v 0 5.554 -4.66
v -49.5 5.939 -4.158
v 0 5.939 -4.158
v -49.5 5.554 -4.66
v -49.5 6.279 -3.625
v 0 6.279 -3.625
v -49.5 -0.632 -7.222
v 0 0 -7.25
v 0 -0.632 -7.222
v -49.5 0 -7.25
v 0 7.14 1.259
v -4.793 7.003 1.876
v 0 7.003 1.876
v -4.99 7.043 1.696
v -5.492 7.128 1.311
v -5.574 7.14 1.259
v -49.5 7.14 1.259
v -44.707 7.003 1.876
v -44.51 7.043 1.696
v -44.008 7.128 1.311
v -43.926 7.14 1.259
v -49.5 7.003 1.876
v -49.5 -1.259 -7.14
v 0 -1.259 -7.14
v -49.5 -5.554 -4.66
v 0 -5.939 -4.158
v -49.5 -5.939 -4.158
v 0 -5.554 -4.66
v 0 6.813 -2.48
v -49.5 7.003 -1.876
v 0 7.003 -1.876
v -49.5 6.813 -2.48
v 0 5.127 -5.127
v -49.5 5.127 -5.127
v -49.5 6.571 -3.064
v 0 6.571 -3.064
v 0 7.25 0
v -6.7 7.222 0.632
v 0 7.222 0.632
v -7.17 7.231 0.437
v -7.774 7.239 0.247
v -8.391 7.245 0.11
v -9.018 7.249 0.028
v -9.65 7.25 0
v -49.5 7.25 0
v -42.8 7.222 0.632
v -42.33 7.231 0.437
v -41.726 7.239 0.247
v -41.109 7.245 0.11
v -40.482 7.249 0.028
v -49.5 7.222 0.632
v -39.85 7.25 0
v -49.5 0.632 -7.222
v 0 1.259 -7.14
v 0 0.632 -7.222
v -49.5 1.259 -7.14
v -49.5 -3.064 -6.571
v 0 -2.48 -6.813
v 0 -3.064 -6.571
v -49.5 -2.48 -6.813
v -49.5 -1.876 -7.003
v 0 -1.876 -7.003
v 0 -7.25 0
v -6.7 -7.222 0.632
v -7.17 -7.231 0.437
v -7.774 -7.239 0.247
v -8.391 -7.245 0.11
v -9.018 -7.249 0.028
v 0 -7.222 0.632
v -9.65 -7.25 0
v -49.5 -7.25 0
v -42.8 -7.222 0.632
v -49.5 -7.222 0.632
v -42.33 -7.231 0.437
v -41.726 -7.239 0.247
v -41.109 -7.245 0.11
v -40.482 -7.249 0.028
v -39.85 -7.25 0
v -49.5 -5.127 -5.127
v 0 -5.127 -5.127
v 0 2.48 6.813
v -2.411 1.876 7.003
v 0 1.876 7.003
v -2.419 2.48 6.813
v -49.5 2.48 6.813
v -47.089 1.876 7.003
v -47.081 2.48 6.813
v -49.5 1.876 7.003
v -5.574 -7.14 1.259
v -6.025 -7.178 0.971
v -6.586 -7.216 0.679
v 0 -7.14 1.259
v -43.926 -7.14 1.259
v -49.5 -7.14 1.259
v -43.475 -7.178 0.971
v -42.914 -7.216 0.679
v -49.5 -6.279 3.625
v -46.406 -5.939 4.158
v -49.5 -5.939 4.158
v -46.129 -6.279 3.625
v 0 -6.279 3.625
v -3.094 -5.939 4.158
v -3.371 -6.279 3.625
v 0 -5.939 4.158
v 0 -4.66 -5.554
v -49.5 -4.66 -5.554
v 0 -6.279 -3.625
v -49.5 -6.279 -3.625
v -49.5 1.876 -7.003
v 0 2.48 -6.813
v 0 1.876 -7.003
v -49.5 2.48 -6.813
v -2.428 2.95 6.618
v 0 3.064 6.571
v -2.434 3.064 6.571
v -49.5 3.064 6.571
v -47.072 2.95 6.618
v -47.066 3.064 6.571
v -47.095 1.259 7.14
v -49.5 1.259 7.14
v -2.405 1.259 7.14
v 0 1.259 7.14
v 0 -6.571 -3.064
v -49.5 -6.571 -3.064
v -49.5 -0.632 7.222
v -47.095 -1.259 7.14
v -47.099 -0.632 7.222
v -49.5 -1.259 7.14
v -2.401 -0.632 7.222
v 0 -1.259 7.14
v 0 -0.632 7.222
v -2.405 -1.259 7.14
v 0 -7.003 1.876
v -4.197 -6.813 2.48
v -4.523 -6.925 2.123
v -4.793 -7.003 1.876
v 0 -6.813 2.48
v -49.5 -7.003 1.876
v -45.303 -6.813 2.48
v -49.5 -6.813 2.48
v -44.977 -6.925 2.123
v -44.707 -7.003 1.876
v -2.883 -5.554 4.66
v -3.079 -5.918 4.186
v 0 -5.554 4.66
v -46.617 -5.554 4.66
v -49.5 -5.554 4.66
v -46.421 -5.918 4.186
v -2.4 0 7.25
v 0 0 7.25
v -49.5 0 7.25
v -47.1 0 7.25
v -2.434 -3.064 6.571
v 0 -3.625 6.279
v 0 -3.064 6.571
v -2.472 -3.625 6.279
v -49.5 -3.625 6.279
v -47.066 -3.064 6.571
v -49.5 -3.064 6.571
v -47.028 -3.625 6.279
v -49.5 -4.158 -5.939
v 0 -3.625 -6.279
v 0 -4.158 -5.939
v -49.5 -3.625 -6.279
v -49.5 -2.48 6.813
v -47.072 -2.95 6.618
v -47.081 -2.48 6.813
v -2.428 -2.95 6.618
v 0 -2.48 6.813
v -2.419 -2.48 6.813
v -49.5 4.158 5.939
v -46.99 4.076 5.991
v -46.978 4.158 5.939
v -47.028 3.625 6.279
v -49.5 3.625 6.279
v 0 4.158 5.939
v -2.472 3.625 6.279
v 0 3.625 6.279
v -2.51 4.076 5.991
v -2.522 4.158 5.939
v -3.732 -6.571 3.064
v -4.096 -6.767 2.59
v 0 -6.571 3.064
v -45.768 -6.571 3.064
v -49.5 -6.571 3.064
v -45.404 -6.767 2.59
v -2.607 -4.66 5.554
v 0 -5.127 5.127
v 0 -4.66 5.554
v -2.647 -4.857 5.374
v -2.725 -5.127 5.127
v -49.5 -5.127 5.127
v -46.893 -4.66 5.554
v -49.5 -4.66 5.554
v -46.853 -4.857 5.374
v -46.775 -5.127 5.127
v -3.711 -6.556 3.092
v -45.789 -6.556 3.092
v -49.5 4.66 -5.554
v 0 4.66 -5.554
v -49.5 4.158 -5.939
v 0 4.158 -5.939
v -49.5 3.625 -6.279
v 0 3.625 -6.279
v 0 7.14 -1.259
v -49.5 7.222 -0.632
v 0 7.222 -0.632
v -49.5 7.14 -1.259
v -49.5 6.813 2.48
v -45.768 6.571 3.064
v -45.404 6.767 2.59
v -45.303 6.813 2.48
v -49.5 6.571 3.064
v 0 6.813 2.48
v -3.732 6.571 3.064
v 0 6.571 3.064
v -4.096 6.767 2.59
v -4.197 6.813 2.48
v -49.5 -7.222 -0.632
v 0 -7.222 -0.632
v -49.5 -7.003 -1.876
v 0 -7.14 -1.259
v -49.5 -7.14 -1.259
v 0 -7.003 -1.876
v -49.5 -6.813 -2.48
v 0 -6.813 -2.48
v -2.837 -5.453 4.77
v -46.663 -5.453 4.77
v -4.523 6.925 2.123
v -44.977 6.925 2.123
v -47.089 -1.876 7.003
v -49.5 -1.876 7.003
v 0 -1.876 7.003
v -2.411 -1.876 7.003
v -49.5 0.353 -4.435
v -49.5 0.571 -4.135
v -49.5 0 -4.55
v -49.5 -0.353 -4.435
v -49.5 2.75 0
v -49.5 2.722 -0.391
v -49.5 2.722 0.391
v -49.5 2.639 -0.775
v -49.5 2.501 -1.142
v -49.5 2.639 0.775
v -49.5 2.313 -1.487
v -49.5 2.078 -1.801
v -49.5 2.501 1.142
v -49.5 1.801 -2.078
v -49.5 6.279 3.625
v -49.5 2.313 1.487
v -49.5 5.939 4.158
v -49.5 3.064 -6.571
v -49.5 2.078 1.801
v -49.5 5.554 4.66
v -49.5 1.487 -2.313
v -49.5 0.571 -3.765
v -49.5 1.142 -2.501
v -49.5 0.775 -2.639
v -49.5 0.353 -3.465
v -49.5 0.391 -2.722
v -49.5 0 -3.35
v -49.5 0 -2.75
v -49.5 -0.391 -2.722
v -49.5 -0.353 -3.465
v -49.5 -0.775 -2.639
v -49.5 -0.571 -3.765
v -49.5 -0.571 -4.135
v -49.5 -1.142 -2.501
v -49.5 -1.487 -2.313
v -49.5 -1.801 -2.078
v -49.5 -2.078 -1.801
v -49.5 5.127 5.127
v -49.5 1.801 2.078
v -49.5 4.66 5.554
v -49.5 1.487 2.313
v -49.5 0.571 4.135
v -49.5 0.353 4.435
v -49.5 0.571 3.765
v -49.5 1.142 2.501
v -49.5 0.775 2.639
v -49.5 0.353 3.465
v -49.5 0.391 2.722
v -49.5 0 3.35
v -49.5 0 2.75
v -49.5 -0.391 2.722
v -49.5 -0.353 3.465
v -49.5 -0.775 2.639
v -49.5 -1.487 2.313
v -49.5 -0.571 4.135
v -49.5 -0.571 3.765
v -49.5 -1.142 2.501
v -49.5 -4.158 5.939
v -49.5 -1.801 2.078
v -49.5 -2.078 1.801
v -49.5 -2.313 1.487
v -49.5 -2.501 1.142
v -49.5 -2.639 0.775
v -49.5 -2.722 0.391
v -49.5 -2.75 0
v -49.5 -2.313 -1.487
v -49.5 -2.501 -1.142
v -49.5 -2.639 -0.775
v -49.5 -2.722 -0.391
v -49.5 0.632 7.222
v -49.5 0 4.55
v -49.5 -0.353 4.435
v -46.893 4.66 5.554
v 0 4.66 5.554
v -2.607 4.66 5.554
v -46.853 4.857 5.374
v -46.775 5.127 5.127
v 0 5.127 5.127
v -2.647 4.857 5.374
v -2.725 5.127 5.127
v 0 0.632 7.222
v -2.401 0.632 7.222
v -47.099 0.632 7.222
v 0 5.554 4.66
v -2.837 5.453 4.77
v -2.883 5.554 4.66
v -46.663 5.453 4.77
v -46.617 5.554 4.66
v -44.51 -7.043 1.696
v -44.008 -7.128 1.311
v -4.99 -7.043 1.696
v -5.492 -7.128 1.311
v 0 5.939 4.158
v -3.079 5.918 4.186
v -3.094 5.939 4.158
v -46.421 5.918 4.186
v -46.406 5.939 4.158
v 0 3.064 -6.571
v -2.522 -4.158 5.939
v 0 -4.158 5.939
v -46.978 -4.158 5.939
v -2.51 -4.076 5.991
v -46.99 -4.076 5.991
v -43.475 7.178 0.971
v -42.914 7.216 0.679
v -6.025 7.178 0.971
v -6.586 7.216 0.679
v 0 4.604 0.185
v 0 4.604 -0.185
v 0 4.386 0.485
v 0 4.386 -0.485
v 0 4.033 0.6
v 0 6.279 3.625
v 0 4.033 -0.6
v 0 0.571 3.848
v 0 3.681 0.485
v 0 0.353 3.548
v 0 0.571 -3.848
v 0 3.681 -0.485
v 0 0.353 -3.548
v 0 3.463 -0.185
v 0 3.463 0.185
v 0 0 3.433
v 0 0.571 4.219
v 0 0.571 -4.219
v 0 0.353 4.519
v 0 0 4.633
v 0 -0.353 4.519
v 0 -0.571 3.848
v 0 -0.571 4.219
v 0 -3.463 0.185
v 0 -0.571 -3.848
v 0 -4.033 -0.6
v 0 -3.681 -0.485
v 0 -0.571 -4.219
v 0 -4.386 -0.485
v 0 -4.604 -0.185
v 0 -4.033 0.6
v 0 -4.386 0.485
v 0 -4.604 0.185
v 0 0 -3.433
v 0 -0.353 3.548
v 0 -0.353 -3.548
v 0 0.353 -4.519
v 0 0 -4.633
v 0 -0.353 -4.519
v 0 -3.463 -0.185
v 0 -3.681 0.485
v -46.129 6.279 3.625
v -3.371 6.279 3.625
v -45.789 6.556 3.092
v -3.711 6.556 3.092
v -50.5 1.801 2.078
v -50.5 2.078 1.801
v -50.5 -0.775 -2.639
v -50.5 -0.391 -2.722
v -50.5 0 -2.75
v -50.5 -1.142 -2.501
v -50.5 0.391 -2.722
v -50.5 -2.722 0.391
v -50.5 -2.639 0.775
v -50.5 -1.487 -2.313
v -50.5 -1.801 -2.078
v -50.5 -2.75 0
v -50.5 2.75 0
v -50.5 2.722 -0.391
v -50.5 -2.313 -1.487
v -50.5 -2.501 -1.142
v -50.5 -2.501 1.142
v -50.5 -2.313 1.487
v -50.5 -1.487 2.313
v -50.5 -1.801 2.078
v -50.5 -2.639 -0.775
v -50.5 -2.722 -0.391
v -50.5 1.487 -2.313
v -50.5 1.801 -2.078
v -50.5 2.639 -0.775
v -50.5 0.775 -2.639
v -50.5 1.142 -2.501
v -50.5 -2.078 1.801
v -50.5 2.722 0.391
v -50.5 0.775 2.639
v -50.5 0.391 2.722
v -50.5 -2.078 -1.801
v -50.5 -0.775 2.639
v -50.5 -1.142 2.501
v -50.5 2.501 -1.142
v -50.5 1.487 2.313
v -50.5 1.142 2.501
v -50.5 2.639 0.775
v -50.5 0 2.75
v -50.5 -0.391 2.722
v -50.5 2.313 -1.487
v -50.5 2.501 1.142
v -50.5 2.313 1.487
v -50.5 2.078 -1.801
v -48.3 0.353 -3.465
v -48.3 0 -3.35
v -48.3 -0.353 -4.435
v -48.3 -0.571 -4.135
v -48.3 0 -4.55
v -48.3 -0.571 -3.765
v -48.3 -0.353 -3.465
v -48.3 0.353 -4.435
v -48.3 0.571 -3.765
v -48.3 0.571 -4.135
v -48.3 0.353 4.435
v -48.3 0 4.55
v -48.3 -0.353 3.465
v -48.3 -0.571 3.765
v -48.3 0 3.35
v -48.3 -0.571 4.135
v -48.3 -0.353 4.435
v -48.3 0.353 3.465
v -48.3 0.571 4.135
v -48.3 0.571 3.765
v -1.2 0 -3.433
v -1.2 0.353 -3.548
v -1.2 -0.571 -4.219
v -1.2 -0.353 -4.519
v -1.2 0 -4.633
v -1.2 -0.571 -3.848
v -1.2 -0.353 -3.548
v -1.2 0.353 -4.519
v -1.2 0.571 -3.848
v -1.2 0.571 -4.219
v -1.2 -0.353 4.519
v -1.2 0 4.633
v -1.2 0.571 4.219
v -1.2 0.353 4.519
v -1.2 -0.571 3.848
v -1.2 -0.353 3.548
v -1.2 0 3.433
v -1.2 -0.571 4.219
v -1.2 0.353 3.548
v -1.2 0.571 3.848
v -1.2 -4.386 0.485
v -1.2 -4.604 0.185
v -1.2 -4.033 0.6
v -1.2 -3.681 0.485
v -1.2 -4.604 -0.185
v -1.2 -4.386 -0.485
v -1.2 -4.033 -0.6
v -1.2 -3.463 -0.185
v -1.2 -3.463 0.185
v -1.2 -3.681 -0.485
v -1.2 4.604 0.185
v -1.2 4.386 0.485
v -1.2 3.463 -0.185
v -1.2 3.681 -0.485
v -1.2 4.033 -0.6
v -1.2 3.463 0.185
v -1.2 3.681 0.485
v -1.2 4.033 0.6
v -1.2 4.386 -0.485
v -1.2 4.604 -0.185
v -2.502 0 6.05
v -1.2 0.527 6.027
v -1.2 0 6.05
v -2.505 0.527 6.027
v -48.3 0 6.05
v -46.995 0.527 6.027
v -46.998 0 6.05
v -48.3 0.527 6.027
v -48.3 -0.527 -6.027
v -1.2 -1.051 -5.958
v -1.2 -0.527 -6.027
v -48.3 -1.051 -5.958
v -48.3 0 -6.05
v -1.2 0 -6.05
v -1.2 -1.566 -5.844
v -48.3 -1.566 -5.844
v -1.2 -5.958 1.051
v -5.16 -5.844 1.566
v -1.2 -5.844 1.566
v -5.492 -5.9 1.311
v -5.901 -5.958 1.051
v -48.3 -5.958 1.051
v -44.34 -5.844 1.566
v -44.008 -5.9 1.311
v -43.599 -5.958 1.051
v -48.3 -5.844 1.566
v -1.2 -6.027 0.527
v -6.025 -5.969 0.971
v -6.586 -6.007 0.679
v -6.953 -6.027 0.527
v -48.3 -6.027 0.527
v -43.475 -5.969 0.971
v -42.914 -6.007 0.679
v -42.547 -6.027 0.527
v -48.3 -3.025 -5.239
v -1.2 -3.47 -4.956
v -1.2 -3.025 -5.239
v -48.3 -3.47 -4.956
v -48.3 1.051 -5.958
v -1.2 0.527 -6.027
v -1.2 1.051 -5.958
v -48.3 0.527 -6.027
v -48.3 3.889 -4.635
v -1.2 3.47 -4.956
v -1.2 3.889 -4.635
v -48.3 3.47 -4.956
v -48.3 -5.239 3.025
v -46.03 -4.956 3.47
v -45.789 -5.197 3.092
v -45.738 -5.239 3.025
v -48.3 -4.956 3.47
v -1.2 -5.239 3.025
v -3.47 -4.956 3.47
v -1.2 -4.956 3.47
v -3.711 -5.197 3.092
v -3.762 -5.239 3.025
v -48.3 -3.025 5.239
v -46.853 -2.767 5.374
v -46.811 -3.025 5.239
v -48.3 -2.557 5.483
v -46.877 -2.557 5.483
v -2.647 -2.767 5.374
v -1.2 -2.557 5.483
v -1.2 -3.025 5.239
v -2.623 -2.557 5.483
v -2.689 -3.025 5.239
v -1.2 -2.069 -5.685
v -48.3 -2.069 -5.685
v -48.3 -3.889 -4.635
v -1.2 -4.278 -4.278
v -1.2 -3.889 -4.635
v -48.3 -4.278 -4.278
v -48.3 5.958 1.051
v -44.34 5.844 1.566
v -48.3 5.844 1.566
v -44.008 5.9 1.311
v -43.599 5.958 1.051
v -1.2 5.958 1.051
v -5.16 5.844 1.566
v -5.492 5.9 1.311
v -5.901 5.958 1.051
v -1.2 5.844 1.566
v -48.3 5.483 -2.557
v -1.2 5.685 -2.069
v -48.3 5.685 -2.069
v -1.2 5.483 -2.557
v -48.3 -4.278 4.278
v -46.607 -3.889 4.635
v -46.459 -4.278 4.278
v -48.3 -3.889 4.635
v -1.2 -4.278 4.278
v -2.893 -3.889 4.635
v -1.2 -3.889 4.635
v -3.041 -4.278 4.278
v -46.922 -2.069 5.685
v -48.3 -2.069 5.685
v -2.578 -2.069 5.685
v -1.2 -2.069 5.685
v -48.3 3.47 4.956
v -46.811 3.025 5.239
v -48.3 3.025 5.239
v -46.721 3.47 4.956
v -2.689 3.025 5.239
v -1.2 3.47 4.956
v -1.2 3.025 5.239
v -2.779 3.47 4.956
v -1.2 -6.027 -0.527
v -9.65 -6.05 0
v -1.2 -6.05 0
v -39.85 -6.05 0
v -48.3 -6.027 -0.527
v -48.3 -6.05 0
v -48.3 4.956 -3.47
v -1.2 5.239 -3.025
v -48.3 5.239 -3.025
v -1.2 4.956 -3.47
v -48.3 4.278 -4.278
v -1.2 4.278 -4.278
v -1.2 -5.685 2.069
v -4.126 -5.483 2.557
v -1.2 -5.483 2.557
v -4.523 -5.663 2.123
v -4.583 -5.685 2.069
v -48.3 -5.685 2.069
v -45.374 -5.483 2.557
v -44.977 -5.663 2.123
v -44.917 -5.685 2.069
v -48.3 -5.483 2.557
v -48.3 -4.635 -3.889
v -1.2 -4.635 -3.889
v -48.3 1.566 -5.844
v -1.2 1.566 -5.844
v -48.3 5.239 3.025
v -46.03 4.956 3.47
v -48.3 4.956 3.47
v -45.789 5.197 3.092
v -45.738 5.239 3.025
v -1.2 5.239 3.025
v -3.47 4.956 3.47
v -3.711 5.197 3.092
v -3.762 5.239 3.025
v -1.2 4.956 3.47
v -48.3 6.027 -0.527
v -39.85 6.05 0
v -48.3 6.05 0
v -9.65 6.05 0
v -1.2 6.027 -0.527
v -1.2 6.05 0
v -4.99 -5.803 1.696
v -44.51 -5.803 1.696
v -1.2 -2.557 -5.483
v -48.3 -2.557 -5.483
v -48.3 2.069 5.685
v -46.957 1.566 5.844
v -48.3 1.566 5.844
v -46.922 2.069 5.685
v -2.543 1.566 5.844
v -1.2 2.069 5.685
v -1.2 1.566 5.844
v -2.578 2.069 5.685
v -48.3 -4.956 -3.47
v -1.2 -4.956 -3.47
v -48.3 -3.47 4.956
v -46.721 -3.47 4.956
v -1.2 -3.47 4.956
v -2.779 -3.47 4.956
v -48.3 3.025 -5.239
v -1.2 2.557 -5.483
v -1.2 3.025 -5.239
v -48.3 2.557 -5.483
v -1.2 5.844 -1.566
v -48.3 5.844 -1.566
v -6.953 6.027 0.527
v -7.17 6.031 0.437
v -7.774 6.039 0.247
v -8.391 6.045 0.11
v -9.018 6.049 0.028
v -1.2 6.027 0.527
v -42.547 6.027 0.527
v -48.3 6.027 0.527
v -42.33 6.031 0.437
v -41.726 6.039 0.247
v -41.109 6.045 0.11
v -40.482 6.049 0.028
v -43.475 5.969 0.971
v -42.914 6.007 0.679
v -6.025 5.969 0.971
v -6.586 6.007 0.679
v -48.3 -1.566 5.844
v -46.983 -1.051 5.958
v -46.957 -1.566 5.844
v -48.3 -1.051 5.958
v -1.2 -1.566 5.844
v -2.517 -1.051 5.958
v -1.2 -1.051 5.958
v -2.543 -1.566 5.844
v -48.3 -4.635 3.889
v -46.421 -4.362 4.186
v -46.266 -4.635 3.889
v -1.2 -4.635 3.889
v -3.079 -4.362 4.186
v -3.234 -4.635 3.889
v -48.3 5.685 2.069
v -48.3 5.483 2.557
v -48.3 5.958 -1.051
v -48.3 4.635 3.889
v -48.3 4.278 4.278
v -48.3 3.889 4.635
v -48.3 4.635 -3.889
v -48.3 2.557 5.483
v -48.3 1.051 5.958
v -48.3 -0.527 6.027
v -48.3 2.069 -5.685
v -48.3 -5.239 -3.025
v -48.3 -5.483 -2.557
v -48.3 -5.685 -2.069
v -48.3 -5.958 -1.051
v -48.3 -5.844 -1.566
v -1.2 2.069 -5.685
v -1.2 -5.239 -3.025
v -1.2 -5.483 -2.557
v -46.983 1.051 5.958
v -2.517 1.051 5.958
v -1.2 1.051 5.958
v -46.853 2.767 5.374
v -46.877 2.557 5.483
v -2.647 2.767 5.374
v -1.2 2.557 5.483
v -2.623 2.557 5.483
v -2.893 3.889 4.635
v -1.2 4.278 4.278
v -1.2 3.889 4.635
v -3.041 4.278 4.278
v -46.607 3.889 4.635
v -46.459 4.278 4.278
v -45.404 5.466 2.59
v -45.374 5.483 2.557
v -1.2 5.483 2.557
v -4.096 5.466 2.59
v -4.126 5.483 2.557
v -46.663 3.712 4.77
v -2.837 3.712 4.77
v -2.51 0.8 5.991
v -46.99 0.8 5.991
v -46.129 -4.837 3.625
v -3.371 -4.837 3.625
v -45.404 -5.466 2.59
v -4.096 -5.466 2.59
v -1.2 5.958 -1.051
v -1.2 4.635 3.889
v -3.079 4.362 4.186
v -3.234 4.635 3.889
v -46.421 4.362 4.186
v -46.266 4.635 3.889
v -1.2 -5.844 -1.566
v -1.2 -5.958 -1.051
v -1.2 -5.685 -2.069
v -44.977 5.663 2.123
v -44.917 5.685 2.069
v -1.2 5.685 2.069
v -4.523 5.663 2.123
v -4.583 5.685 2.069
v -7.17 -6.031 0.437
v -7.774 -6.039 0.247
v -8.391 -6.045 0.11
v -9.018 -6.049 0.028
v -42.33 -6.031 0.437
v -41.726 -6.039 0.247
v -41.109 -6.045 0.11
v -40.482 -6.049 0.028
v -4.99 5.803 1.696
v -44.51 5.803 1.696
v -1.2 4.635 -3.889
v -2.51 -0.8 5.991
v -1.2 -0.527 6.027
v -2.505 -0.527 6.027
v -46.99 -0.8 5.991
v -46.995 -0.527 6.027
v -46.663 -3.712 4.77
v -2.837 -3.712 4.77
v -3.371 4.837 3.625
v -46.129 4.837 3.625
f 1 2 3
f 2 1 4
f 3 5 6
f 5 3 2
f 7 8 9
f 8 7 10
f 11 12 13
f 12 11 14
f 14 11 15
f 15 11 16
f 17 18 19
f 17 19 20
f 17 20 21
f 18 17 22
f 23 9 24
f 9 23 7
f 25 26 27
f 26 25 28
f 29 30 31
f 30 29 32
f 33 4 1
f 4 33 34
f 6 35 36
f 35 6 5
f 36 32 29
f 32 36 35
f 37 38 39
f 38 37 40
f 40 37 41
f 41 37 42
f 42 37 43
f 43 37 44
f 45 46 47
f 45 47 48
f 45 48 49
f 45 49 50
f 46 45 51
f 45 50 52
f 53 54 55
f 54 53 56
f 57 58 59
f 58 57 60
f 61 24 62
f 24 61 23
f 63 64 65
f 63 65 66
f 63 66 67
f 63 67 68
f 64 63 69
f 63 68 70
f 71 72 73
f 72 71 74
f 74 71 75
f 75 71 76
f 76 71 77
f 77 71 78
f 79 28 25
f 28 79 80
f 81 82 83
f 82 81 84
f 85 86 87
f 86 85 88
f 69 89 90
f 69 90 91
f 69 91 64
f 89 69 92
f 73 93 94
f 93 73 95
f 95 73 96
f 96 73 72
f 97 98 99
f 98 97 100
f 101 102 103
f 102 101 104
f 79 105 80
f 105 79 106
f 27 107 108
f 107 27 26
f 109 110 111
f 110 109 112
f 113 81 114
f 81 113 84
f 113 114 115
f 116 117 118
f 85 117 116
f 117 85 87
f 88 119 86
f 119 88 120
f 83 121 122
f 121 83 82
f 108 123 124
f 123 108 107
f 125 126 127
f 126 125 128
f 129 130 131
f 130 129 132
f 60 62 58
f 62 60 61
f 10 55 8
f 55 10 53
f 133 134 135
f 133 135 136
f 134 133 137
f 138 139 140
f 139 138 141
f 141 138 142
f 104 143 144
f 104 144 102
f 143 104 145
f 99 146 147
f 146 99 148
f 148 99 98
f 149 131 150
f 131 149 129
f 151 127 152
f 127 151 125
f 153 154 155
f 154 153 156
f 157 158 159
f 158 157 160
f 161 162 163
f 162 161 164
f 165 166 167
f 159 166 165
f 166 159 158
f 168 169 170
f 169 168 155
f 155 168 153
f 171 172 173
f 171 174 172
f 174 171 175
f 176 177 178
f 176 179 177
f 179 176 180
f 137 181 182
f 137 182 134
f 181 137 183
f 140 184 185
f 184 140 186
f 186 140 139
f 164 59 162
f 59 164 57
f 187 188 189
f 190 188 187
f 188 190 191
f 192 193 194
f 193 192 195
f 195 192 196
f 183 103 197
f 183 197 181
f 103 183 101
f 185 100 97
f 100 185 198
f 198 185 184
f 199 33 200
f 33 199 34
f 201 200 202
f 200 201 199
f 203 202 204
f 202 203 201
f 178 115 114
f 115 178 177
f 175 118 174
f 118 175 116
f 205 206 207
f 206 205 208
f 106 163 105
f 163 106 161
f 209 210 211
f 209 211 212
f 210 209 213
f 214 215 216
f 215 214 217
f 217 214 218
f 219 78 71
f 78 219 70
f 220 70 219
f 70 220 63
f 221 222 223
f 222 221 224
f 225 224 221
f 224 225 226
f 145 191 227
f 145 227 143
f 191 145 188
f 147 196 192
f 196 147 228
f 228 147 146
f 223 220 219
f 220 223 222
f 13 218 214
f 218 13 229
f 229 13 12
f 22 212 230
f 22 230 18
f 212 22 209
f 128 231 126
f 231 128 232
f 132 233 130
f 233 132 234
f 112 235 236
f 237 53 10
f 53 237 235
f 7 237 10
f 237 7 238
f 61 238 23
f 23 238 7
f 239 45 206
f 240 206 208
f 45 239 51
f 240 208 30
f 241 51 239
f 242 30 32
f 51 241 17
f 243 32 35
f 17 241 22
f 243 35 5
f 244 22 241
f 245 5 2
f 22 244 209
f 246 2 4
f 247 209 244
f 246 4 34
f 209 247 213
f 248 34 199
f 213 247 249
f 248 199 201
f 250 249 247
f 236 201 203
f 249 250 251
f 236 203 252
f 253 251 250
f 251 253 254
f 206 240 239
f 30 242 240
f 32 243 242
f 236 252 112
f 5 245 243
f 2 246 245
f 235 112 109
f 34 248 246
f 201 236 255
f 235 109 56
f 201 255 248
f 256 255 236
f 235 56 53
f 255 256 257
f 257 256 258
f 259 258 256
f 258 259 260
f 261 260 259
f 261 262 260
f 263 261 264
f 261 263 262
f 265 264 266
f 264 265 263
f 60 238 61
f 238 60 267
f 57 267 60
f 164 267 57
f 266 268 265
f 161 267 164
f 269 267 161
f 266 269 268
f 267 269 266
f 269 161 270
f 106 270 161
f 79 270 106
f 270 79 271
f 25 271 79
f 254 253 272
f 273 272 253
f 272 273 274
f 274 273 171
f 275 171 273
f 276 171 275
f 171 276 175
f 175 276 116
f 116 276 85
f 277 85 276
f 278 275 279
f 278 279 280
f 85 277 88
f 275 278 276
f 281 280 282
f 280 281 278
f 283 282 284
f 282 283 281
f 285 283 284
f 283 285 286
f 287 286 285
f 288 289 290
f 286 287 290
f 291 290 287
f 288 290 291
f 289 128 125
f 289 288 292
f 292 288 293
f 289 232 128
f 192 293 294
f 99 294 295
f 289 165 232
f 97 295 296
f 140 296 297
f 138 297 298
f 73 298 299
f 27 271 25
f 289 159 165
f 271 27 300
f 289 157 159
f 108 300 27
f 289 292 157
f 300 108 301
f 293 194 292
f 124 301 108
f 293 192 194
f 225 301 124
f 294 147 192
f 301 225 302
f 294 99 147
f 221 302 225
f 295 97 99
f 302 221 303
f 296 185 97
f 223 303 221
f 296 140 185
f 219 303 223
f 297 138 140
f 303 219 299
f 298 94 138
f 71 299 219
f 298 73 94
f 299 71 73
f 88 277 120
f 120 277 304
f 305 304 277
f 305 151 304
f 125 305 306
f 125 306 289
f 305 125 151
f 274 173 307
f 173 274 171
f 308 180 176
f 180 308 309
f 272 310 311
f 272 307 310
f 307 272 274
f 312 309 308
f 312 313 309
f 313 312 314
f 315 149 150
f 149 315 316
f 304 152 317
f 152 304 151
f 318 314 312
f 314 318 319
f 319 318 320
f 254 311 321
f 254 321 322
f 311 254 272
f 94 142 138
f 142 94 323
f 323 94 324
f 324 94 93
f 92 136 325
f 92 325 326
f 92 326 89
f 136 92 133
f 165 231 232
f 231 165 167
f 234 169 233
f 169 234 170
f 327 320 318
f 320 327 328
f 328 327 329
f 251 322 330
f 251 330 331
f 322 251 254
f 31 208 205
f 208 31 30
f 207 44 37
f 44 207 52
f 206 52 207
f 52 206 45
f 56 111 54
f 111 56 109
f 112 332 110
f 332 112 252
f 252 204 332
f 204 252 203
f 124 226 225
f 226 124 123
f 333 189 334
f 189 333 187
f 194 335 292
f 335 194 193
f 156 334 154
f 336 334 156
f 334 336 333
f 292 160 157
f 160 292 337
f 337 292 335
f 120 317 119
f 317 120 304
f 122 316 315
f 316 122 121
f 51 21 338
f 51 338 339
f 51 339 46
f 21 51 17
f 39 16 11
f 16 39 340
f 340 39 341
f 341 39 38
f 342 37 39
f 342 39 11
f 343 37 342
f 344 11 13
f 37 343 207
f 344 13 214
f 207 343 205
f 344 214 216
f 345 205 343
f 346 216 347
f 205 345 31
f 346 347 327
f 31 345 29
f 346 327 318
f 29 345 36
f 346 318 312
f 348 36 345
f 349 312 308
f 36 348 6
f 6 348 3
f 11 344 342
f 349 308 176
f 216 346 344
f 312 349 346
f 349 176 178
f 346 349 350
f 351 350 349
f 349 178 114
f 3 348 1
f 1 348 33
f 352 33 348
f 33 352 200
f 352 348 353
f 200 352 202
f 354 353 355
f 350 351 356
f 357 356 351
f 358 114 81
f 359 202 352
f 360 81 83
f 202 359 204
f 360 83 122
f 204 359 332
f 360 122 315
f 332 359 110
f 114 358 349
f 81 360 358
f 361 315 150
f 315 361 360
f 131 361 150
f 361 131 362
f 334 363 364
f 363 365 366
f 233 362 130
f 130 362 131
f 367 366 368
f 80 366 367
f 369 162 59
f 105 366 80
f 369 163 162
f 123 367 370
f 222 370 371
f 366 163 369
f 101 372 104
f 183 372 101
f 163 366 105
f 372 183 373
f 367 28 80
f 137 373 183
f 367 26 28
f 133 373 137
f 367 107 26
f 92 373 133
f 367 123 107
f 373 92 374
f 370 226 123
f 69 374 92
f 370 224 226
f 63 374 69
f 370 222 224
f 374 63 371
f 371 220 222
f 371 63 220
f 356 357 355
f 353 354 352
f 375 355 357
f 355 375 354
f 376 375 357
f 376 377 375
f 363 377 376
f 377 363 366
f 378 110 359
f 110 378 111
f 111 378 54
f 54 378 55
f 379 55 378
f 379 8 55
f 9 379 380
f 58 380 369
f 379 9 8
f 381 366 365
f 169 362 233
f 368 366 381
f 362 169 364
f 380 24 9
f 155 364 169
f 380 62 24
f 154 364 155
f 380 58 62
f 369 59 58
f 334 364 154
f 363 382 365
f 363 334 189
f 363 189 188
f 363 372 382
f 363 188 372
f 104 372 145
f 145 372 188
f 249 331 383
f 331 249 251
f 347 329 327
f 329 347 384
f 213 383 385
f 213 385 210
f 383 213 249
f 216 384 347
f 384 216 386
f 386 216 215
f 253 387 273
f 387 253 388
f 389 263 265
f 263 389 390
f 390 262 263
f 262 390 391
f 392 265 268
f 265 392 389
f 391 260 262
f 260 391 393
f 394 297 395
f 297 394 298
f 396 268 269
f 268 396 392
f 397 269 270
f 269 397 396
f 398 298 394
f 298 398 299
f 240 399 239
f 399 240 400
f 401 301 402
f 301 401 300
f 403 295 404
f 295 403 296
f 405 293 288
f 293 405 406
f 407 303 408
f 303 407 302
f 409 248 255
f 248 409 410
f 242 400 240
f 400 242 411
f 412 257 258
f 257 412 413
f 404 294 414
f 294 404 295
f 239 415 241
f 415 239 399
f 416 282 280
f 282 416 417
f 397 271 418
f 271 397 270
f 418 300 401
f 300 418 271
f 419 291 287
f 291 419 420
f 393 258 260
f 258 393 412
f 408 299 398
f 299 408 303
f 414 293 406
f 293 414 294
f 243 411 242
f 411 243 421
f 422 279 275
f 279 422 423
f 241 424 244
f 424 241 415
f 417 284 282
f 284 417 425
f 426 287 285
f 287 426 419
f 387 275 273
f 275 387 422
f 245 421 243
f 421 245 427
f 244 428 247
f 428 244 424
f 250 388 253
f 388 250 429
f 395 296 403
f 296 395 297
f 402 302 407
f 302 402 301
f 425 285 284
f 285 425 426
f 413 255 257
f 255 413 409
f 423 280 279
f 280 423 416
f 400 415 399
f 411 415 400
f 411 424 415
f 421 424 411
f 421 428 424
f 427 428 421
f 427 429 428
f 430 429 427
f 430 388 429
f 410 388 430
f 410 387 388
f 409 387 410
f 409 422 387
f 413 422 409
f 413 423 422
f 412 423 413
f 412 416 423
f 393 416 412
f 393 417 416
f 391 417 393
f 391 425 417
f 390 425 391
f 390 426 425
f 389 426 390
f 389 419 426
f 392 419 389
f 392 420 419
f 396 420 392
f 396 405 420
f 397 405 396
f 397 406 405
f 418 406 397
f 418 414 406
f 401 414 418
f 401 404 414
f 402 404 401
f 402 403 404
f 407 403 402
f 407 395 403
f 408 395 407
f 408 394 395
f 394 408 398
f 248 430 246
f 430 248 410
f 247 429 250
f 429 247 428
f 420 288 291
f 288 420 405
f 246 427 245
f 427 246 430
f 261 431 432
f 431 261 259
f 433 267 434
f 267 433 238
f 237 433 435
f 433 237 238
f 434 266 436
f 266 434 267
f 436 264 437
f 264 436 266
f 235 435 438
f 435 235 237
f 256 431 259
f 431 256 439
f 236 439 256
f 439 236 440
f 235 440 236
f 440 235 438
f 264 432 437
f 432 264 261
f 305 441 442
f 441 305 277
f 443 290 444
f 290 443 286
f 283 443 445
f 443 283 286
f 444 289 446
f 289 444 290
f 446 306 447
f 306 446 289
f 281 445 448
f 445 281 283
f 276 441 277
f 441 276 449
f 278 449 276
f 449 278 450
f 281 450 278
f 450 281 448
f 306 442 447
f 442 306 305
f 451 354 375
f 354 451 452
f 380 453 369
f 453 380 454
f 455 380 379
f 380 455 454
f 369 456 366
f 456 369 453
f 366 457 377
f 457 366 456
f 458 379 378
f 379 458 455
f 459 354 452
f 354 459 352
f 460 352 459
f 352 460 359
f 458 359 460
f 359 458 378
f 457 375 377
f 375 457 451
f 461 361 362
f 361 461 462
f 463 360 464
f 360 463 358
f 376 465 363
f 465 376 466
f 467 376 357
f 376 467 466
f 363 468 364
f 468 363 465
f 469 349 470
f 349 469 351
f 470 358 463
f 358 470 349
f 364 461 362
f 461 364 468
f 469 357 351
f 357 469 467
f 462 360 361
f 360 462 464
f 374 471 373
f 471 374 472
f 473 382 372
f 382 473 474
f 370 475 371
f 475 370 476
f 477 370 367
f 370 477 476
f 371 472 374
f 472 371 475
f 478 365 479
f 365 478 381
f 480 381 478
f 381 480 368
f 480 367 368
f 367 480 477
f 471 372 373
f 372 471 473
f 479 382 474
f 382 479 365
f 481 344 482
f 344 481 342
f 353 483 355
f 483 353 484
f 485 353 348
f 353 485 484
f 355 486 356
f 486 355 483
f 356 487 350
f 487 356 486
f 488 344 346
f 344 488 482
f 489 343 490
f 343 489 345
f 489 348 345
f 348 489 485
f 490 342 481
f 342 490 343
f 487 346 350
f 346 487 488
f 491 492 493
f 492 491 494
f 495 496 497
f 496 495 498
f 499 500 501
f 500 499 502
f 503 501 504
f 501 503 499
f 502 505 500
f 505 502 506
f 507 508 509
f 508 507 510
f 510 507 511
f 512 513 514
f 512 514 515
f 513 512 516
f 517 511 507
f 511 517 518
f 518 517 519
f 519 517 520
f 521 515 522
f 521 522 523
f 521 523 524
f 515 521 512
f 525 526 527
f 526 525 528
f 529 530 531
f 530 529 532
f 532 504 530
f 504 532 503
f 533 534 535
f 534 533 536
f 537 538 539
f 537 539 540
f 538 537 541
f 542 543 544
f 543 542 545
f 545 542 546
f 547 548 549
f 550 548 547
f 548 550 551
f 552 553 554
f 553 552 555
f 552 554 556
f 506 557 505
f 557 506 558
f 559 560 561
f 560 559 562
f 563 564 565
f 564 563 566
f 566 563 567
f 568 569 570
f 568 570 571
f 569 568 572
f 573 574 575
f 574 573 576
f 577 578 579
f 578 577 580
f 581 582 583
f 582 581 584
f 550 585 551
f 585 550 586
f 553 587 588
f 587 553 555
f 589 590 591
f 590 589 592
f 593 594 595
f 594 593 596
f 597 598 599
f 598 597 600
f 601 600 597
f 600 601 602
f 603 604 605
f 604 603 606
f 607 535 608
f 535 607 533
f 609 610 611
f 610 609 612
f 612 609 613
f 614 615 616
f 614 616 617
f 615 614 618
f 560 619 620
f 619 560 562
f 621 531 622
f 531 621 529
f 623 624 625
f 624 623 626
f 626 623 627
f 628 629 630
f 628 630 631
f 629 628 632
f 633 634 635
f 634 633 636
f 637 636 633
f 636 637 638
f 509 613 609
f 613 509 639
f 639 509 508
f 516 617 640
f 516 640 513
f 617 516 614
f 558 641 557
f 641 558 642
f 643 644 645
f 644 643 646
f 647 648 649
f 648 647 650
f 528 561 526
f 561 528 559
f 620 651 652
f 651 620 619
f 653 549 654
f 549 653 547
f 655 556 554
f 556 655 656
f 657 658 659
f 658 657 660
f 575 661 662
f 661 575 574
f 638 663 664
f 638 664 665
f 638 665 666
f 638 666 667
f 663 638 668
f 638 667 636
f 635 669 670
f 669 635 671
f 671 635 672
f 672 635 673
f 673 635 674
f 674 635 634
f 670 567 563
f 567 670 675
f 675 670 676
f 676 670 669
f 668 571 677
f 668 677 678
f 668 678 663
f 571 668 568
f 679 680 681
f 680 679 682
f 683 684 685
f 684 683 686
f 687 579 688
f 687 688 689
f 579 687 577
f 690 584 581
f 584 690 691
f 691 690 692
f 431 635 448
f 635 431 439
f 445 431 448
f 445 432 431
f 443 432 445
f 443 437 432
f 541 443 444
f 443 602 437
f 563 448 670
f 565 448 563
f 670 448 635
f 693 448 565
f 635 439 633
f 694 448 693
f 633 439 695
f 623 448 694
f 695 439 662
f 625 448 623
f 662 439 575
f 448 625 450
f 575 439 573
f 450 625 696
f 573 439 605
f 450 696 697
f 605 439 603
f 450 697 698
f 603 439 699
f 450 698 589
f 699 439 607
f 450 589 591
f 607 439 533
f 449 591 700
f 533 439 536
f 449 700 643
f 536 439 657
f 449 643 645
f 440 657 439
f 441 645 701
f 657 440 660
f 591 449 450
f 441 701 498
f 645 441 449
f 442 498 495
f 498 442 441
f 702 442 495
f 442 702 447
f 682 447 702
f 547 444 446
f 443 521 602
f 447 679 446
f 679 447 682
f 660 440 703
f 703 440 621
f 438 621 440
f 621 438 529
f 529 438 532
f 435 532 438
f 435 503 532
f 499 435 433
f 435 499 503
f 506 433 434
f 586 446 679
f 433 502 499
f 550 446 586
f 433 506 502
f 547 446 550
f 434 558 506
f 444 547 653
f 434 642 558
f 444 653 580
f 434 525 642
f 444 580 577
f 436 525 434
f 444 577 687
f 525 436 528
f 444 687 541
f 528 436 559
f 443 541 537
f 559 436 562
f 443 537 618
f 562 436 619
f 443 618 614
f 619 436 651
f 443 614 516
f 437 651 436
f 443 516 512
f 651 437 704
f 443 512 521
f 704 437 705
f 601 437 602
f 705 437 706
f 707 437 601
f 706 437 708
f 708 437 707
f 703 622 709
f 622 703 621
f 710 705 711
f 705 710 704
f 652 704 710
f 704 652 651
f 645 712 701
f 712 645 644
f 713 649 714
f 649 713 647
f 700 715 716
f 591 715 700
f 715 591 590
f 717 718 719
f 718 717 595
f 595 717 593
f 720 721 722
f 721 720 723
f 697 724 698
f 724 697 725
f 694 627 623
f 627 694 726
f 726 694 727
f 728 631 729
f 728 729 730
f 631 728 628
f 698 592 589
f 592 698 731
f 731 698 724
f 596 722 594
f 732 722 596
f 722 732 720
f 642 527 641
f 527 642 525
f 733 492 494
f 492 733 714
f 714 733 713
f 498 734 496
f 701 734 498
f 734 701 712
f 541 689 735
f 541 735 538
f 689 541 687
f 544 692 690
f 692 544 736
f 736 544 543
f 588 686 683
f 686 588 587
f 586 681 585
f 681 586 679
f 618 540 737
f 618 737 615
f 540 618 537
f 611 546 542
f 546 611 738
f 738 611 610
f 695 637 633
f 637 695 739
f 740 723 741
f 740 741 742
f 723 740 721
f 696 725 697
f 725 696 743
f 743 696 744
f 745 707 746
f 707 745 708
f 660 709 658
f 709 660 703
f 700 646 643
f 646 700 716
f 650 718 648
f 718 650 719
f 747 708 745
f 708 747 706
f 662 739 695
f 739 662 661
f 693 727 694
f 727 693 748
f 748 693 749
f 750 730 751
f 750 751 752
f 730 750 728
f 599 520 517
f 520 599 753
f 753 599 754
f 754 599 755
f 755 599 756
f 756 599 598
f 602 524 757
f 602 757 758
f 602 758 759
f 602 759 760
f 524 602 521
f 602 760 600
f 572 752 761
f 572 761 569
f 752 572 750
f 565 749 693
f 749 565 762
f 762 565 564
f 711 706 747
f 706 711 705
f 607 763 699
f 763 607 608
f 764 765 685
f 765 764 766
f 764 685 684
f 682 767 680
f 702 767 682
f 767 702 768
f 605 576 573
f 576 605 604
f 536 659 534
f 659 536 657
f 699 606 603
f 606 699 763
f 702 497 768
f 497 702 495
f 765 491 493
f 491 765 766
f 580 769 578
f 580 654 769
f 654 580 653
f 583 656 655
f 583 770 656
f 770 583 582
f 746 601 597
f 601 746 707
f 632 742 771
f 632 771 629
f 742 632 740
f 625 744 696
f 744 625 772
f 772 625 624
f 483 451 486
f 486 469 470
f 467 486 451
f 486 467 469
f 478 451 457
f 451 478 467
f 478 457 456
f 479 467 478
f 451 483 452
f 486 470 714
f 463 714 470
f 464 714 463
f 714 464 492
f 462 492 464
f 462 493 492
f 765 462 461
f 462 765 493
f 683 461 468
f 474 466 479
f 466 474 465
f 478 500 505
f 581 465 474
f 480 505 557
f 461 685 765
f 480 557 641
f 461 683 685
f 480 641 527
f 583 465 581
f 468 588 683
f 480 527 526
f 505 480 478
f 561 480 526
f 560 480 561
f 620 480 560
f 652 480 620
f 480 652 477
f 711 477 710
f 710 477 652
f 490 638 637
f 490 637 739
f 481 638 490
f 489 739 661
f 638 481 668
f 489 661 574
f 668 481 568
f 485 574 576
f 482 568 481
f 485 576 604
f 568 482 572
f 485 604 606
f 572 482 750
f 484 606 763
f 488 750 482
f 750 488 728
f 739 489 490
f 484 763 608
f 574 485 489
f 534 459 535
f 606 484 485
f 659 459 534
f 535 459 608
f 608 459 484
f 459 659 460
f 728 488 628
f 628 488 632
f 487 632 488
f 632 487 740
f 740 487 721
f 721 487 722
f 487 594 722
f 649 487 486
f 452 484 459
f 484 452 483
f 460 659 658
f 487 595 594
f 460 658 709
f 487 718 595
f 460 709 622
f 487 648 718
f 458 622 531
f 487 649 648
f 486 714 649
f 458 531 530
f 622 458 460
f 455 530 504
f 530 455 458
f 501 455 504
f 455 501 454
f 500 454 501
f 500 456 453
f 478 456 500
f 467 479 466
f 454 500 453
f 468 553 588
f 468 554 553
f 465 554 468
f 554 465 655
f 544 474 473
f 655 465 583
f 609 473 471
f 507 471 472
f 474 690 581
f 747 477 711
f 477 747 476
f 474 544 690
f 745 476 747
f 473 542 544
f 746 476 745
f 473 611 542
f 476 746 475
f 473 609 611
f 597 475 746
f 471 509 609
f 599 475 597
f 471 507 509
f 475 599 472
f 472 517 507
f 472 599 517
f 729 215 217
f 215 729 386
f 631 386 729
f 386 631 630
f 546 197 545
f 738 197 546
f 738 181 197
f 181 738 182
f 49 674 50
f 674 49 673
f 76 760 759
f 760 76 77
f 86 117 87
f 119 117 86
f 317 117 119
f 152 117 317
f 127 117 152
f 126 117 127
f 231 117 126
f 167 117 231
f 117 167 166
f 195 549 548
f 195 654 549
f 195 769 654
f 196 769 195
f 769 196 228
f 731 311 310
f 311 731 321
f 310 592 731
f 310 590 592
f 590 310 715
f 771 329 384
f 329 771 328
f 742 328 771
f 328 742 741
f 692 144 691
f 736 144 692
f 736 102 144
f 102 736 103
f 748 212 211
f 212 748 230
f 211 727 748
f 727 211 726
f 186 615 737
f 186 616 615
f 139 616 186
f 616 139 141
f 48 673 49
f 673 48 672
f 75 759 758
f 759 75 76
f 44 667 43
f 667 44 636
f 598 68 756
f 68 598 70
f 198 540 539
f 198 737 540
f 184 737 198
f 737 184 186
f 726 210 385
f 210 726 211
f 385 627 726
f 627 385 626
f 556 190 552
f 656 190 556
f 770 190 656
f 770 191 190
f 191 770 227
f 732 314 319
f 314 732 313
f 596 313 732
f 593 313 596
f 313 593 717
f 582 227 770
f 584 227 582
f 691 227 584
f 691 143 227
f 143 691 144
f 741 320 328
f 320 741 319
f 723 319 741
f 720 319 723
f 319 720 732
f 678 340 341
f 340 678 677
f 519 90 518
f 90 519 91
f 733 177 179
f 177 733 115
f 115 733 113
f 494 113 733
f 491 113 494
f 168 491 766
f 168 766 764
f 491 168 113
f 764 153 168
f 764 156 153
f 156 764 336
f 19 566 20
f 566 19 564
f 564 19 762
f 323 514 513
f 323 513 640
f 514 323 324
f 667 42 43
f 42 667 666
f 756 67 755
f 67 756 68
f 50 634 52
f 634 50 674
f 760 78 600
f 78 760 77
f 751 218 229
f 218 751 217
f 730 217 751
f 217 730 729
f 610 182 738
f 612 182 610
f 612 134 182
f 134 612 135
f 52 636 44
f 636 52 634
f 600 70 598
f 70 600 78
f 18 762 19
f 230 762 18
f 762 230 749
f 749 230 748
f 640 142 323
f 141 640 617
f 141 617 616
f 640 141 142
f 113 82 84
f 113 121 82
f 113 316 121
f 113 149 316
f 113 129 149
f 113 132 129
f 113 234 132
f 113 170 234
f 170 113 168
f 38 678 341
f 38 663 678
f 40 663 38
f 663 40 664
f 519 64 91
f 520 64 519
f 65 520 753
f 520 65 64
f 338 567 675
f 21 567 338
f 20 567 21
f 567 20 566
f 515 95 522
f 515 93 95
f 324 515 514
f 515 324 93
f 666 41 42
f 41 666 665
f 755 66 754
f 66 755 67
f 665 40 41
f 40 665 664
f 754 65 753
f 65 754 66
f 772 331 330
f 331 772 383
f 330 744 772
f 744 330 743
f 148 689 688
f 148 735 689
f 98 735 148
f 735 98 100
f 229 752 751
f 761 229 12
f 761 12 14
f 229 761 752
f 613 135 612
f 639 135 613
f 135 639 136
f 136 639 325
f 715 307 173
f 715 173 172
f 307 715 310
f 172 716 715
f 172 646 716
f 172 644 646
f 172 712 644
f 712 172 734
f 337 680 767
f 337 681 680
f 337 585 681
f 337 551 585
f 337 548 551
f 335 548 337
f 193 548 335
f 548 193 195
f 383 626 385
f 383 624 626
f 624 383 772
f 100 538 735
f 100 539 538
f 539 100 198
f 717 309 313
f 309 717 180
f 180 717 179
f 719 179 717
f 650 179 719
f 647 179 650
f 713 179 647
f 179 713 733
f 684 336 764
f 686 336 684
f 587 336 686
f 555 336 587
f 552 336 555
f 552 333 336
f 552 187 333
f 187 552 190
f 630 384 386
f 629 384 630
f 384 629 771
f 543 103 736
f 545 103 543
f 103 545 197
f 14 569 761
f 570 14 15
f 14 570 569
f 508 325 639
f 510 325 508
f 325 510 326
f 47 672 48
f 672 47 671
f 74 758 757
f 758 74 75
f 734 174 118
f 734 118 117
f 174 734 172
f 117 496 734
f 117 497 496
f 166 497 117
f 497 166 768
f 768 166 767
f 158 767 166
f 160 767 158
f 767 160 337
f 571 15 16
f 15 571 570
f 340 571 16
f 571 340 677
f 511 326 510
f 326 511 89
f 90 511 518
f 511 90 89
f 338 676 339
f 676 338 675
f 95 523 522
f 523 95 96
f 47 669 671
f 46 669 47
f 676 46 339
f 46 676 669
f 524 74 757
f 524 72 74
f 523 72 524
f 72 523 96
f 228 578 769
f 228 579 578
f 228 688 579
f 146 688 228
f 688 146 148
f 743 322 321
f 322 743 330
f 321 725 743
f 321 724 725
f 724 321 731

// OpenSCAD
////////////////////////////////////////////////////////////////////////////////
//
// Dummy Battery
//
////////////////////////////////////////////////////////////////////////////////

// battery type (for the 'Generic' type set the values in the 'Generic Battery' section below)
battery_type    = "AA" ; // [AAA,AA,C,D,Generic,Demo]

/* [Settings for Generic Battery (mm)] */
// diameter of the body
body_diameter   = 14.5 ; // [8:0.1:40]
// height of body plus pin
body_height     = 50.5 ; // [35:0.1:60]
// width of the body wall
body_wall_width =  1.2 ; // [0.7:0.1:5]
// diameter of the pin
pin_diameter    =  5.5 ; // [3:0.1:12]
// height of the pin
pin_height      =  1.0 ; // [0.7:0.1:2.5]
// diameter of the holes for the wire
wire_diameter   =  1.2 ; // [0.7:0.1:2]

////////////////////////////////////////////////////////////////////////////////

/* [Hidden] */

// column index into Batt
cName        = 0 ; // name
cDiameter    = 1 ; // body diameter
cHeight      = 2 ; // body height (incl pin height)
cWidth       = 3 ; // wall width
cPinDiameter = 4 ; // pin diameter
cPinHeight   = 5 ; // pin width
cWire        = 6 ; // wire diameter

/*
  Dimensions:
  
  D   http://data.energizer.com/pdfs/e95.pdf
      http://professional.duracell.com/downloads/datasheets/product/Industrial/Industrial%20D.pdf
  C   http://data.energizer.com/pdfs/e93.pdf
      http://professional.duracell.com/downloads/datasheets/product/Industrial/Industrial%20C.pdf  
  AA  http://data.energizer.com/pdfs/e91.pdf
      http://professional.duracell.com/downloads/datasheets/product/Industrial/Industrial%20AA.pdf
  AAA http://data.energizer.com/pdfs/l92.pdf
      http://professional.duracell.com/downloads/datasheets/product/Industrial/Industrial%20AAA.pdf
*/

// Note: Battery length is the height of the battery body and plus the pin height.
Batt =
[ // name, diam, heig, wid, pinD, pinH, wire
  [ "D"  , 34.2, 61.5, 1.5,  9.5,  1.5, 1.2 ],
  [ "C"  , 26.2, 50.0, 1.5,  7.5,  1.5, 1.2 ],
  [ "AA" , 14.5, 50.5, 1.2,  5.5,  1.0, 1.2 ],
  [ "AAA", 10.5, 44.5, 1.0,  3.8,  0.8, 1.2 ]
] ;

$fa =  5 ;
$fs =  0.4 ;

////////////////////////////////////////////////////////////////////////////////

module battery(batt)
{
  radius = batt[cDiameter] / 2 ;
  height = batt[cHeight] - batt[cPinHeight] ;

  difference()
  {
    union()
    {
      cylinder(h=height, r=radius); // outer
      translate([0,0,height-0.1])
      {
	cylinder(h=batt[cPinHeight]+0.1, d=batt[cPinDiameter]) ; // pin on top
      }
    }
    color("lightgreen")
    translate([0, 0, batt[cWidth]]) { cylinder(h=height-2*batt[cWidth], r=radius-batt[cWidth]) ; }  // inner

    // (+) wire
    color("red")
    {
      offsetTop1 = (batt[cPinDiameter] + 2*batt[cWire]) / 2 ;
      offsetTop2 = batt[cDiameter]/2 - batt[cWidth] - 0.5*batt[cWire] ;
      offsetTop = offsetTop1 < offsetTop2 ? offsetTop1 : offsetTop2 ;
      translate([ offsetTop, 0,height-1.5*batt[cWidth]]) { cylinder(h=2*batt[cWidth]+batt[cPinHeight], d=batt[cWire]) ; }
      translate([-offsetTop, 0,height-1.5*batt[cWidth]]) { cylinder(h=2*batt[cWidth]+batt[cPinHeight], d=batt[cWire]) ; }
    }

    // (-) wire
    color("black")
    {
      offsetBottom = (batt[cDiameter]/2 - batt[cWidth]) * 2 / 3 ;
      translate([ offsetBottom, 0, -batt[cWidth]/2]) { cylinder(h=2*batt[cWidth], d=batt[cWire]) ; } 
      translate([-offsetBottom, 0, -batt[cWidth]/2]) { cylinder(h=2*batt[cWidth], d=batt[cWire]) ; }
      translate([ 0, offsetBottom, -batt[cWidth]/2]) { cylinder(h=2*batt[cWidth], d=batt[cWire]) ; }
      translate([ 0,-offsetBottom, -batt[cWidth]/2]) { cylinder(h=2*batt[cWidth], d=batt[cWire]) ; }
    }

    color("orange")
    hull() // cut-out
    {
      translate([-radius, radius, radius+2*batt[cWidth]])
        rotate([90,0,0])
        cylinder(h=2*radius, r=radius) ;
      translate([-radius, radius, height-radius-2*batt[cWidth]])
        rotate([90,0,0])
        cylinder(h=2*radius, r=radius) ;
    }
  }
}

////////////////////////////////////////////////////////////////////////////////

module batteryType(battery_type, body_diameter, body_height, body_wall_width, pin_diameter, pin_height, wire_diameter)
{
  idx = search([battery_type], Batt) ;
  if (idx != [[]])
  {
    battery(Batt[idx[0]]) ;
  }
  else if (battery_type == "Demo")
  {
    iD   = search(["D"  ], Batt) ;   rD   = Batt[iD  [0]][cDiameter] / 2 ;
    iC   = search(["C"  ], Batt) ;   rC   = Batt[iC  [0]][cDiameter] / 2 ;
    iAA  = search(["AA" ], Batt) ;   rAA  = Batt[iAA [0]][cDiameter] / 2 ;
    iAAA = search(["AAA"], Batt) ;   rAAA = Batt[iAAA[0]][cDiameter] / 2 ;

    dD   =   rD                              ; translate([-rD  , dD  , 0]) batteryType("D"  ) ;
    dC   = 2*rD +   rC                  + 10 ; translate([-rC  , dC  , 0]) batteryType("C"  ) ;
    dAA  = 2*rD + 2*rC +   rAA          + 20 ; translate([-rAA , dAA , 0]) batteryType("AA" ) ;
    dAAA = 2*rD + 2*rC + 2*rAA +   rAAA + 30 ; translate([-rAAA, dAAA, 0]) batteryType("AAA") ;
  }
  else
  {
    battery(["Generic", body_diameter, body_height, body_wall_width, pin_diameter, pin_height, wire_diameter]) ;
  }
}

////////////////////////////////////////////////////////////////////////////////

rotate([0,0,180])
rotate([0, 90, 0])
  batteryType(battery_type, body_diameter, body_height, body_wall_width, pin_diameter, pin_height, wire_diameter) ;

////////////////////////////////////////////////////////////////////////////////
// EOF
////////////////////////////////////////////////////////////////////////////////
